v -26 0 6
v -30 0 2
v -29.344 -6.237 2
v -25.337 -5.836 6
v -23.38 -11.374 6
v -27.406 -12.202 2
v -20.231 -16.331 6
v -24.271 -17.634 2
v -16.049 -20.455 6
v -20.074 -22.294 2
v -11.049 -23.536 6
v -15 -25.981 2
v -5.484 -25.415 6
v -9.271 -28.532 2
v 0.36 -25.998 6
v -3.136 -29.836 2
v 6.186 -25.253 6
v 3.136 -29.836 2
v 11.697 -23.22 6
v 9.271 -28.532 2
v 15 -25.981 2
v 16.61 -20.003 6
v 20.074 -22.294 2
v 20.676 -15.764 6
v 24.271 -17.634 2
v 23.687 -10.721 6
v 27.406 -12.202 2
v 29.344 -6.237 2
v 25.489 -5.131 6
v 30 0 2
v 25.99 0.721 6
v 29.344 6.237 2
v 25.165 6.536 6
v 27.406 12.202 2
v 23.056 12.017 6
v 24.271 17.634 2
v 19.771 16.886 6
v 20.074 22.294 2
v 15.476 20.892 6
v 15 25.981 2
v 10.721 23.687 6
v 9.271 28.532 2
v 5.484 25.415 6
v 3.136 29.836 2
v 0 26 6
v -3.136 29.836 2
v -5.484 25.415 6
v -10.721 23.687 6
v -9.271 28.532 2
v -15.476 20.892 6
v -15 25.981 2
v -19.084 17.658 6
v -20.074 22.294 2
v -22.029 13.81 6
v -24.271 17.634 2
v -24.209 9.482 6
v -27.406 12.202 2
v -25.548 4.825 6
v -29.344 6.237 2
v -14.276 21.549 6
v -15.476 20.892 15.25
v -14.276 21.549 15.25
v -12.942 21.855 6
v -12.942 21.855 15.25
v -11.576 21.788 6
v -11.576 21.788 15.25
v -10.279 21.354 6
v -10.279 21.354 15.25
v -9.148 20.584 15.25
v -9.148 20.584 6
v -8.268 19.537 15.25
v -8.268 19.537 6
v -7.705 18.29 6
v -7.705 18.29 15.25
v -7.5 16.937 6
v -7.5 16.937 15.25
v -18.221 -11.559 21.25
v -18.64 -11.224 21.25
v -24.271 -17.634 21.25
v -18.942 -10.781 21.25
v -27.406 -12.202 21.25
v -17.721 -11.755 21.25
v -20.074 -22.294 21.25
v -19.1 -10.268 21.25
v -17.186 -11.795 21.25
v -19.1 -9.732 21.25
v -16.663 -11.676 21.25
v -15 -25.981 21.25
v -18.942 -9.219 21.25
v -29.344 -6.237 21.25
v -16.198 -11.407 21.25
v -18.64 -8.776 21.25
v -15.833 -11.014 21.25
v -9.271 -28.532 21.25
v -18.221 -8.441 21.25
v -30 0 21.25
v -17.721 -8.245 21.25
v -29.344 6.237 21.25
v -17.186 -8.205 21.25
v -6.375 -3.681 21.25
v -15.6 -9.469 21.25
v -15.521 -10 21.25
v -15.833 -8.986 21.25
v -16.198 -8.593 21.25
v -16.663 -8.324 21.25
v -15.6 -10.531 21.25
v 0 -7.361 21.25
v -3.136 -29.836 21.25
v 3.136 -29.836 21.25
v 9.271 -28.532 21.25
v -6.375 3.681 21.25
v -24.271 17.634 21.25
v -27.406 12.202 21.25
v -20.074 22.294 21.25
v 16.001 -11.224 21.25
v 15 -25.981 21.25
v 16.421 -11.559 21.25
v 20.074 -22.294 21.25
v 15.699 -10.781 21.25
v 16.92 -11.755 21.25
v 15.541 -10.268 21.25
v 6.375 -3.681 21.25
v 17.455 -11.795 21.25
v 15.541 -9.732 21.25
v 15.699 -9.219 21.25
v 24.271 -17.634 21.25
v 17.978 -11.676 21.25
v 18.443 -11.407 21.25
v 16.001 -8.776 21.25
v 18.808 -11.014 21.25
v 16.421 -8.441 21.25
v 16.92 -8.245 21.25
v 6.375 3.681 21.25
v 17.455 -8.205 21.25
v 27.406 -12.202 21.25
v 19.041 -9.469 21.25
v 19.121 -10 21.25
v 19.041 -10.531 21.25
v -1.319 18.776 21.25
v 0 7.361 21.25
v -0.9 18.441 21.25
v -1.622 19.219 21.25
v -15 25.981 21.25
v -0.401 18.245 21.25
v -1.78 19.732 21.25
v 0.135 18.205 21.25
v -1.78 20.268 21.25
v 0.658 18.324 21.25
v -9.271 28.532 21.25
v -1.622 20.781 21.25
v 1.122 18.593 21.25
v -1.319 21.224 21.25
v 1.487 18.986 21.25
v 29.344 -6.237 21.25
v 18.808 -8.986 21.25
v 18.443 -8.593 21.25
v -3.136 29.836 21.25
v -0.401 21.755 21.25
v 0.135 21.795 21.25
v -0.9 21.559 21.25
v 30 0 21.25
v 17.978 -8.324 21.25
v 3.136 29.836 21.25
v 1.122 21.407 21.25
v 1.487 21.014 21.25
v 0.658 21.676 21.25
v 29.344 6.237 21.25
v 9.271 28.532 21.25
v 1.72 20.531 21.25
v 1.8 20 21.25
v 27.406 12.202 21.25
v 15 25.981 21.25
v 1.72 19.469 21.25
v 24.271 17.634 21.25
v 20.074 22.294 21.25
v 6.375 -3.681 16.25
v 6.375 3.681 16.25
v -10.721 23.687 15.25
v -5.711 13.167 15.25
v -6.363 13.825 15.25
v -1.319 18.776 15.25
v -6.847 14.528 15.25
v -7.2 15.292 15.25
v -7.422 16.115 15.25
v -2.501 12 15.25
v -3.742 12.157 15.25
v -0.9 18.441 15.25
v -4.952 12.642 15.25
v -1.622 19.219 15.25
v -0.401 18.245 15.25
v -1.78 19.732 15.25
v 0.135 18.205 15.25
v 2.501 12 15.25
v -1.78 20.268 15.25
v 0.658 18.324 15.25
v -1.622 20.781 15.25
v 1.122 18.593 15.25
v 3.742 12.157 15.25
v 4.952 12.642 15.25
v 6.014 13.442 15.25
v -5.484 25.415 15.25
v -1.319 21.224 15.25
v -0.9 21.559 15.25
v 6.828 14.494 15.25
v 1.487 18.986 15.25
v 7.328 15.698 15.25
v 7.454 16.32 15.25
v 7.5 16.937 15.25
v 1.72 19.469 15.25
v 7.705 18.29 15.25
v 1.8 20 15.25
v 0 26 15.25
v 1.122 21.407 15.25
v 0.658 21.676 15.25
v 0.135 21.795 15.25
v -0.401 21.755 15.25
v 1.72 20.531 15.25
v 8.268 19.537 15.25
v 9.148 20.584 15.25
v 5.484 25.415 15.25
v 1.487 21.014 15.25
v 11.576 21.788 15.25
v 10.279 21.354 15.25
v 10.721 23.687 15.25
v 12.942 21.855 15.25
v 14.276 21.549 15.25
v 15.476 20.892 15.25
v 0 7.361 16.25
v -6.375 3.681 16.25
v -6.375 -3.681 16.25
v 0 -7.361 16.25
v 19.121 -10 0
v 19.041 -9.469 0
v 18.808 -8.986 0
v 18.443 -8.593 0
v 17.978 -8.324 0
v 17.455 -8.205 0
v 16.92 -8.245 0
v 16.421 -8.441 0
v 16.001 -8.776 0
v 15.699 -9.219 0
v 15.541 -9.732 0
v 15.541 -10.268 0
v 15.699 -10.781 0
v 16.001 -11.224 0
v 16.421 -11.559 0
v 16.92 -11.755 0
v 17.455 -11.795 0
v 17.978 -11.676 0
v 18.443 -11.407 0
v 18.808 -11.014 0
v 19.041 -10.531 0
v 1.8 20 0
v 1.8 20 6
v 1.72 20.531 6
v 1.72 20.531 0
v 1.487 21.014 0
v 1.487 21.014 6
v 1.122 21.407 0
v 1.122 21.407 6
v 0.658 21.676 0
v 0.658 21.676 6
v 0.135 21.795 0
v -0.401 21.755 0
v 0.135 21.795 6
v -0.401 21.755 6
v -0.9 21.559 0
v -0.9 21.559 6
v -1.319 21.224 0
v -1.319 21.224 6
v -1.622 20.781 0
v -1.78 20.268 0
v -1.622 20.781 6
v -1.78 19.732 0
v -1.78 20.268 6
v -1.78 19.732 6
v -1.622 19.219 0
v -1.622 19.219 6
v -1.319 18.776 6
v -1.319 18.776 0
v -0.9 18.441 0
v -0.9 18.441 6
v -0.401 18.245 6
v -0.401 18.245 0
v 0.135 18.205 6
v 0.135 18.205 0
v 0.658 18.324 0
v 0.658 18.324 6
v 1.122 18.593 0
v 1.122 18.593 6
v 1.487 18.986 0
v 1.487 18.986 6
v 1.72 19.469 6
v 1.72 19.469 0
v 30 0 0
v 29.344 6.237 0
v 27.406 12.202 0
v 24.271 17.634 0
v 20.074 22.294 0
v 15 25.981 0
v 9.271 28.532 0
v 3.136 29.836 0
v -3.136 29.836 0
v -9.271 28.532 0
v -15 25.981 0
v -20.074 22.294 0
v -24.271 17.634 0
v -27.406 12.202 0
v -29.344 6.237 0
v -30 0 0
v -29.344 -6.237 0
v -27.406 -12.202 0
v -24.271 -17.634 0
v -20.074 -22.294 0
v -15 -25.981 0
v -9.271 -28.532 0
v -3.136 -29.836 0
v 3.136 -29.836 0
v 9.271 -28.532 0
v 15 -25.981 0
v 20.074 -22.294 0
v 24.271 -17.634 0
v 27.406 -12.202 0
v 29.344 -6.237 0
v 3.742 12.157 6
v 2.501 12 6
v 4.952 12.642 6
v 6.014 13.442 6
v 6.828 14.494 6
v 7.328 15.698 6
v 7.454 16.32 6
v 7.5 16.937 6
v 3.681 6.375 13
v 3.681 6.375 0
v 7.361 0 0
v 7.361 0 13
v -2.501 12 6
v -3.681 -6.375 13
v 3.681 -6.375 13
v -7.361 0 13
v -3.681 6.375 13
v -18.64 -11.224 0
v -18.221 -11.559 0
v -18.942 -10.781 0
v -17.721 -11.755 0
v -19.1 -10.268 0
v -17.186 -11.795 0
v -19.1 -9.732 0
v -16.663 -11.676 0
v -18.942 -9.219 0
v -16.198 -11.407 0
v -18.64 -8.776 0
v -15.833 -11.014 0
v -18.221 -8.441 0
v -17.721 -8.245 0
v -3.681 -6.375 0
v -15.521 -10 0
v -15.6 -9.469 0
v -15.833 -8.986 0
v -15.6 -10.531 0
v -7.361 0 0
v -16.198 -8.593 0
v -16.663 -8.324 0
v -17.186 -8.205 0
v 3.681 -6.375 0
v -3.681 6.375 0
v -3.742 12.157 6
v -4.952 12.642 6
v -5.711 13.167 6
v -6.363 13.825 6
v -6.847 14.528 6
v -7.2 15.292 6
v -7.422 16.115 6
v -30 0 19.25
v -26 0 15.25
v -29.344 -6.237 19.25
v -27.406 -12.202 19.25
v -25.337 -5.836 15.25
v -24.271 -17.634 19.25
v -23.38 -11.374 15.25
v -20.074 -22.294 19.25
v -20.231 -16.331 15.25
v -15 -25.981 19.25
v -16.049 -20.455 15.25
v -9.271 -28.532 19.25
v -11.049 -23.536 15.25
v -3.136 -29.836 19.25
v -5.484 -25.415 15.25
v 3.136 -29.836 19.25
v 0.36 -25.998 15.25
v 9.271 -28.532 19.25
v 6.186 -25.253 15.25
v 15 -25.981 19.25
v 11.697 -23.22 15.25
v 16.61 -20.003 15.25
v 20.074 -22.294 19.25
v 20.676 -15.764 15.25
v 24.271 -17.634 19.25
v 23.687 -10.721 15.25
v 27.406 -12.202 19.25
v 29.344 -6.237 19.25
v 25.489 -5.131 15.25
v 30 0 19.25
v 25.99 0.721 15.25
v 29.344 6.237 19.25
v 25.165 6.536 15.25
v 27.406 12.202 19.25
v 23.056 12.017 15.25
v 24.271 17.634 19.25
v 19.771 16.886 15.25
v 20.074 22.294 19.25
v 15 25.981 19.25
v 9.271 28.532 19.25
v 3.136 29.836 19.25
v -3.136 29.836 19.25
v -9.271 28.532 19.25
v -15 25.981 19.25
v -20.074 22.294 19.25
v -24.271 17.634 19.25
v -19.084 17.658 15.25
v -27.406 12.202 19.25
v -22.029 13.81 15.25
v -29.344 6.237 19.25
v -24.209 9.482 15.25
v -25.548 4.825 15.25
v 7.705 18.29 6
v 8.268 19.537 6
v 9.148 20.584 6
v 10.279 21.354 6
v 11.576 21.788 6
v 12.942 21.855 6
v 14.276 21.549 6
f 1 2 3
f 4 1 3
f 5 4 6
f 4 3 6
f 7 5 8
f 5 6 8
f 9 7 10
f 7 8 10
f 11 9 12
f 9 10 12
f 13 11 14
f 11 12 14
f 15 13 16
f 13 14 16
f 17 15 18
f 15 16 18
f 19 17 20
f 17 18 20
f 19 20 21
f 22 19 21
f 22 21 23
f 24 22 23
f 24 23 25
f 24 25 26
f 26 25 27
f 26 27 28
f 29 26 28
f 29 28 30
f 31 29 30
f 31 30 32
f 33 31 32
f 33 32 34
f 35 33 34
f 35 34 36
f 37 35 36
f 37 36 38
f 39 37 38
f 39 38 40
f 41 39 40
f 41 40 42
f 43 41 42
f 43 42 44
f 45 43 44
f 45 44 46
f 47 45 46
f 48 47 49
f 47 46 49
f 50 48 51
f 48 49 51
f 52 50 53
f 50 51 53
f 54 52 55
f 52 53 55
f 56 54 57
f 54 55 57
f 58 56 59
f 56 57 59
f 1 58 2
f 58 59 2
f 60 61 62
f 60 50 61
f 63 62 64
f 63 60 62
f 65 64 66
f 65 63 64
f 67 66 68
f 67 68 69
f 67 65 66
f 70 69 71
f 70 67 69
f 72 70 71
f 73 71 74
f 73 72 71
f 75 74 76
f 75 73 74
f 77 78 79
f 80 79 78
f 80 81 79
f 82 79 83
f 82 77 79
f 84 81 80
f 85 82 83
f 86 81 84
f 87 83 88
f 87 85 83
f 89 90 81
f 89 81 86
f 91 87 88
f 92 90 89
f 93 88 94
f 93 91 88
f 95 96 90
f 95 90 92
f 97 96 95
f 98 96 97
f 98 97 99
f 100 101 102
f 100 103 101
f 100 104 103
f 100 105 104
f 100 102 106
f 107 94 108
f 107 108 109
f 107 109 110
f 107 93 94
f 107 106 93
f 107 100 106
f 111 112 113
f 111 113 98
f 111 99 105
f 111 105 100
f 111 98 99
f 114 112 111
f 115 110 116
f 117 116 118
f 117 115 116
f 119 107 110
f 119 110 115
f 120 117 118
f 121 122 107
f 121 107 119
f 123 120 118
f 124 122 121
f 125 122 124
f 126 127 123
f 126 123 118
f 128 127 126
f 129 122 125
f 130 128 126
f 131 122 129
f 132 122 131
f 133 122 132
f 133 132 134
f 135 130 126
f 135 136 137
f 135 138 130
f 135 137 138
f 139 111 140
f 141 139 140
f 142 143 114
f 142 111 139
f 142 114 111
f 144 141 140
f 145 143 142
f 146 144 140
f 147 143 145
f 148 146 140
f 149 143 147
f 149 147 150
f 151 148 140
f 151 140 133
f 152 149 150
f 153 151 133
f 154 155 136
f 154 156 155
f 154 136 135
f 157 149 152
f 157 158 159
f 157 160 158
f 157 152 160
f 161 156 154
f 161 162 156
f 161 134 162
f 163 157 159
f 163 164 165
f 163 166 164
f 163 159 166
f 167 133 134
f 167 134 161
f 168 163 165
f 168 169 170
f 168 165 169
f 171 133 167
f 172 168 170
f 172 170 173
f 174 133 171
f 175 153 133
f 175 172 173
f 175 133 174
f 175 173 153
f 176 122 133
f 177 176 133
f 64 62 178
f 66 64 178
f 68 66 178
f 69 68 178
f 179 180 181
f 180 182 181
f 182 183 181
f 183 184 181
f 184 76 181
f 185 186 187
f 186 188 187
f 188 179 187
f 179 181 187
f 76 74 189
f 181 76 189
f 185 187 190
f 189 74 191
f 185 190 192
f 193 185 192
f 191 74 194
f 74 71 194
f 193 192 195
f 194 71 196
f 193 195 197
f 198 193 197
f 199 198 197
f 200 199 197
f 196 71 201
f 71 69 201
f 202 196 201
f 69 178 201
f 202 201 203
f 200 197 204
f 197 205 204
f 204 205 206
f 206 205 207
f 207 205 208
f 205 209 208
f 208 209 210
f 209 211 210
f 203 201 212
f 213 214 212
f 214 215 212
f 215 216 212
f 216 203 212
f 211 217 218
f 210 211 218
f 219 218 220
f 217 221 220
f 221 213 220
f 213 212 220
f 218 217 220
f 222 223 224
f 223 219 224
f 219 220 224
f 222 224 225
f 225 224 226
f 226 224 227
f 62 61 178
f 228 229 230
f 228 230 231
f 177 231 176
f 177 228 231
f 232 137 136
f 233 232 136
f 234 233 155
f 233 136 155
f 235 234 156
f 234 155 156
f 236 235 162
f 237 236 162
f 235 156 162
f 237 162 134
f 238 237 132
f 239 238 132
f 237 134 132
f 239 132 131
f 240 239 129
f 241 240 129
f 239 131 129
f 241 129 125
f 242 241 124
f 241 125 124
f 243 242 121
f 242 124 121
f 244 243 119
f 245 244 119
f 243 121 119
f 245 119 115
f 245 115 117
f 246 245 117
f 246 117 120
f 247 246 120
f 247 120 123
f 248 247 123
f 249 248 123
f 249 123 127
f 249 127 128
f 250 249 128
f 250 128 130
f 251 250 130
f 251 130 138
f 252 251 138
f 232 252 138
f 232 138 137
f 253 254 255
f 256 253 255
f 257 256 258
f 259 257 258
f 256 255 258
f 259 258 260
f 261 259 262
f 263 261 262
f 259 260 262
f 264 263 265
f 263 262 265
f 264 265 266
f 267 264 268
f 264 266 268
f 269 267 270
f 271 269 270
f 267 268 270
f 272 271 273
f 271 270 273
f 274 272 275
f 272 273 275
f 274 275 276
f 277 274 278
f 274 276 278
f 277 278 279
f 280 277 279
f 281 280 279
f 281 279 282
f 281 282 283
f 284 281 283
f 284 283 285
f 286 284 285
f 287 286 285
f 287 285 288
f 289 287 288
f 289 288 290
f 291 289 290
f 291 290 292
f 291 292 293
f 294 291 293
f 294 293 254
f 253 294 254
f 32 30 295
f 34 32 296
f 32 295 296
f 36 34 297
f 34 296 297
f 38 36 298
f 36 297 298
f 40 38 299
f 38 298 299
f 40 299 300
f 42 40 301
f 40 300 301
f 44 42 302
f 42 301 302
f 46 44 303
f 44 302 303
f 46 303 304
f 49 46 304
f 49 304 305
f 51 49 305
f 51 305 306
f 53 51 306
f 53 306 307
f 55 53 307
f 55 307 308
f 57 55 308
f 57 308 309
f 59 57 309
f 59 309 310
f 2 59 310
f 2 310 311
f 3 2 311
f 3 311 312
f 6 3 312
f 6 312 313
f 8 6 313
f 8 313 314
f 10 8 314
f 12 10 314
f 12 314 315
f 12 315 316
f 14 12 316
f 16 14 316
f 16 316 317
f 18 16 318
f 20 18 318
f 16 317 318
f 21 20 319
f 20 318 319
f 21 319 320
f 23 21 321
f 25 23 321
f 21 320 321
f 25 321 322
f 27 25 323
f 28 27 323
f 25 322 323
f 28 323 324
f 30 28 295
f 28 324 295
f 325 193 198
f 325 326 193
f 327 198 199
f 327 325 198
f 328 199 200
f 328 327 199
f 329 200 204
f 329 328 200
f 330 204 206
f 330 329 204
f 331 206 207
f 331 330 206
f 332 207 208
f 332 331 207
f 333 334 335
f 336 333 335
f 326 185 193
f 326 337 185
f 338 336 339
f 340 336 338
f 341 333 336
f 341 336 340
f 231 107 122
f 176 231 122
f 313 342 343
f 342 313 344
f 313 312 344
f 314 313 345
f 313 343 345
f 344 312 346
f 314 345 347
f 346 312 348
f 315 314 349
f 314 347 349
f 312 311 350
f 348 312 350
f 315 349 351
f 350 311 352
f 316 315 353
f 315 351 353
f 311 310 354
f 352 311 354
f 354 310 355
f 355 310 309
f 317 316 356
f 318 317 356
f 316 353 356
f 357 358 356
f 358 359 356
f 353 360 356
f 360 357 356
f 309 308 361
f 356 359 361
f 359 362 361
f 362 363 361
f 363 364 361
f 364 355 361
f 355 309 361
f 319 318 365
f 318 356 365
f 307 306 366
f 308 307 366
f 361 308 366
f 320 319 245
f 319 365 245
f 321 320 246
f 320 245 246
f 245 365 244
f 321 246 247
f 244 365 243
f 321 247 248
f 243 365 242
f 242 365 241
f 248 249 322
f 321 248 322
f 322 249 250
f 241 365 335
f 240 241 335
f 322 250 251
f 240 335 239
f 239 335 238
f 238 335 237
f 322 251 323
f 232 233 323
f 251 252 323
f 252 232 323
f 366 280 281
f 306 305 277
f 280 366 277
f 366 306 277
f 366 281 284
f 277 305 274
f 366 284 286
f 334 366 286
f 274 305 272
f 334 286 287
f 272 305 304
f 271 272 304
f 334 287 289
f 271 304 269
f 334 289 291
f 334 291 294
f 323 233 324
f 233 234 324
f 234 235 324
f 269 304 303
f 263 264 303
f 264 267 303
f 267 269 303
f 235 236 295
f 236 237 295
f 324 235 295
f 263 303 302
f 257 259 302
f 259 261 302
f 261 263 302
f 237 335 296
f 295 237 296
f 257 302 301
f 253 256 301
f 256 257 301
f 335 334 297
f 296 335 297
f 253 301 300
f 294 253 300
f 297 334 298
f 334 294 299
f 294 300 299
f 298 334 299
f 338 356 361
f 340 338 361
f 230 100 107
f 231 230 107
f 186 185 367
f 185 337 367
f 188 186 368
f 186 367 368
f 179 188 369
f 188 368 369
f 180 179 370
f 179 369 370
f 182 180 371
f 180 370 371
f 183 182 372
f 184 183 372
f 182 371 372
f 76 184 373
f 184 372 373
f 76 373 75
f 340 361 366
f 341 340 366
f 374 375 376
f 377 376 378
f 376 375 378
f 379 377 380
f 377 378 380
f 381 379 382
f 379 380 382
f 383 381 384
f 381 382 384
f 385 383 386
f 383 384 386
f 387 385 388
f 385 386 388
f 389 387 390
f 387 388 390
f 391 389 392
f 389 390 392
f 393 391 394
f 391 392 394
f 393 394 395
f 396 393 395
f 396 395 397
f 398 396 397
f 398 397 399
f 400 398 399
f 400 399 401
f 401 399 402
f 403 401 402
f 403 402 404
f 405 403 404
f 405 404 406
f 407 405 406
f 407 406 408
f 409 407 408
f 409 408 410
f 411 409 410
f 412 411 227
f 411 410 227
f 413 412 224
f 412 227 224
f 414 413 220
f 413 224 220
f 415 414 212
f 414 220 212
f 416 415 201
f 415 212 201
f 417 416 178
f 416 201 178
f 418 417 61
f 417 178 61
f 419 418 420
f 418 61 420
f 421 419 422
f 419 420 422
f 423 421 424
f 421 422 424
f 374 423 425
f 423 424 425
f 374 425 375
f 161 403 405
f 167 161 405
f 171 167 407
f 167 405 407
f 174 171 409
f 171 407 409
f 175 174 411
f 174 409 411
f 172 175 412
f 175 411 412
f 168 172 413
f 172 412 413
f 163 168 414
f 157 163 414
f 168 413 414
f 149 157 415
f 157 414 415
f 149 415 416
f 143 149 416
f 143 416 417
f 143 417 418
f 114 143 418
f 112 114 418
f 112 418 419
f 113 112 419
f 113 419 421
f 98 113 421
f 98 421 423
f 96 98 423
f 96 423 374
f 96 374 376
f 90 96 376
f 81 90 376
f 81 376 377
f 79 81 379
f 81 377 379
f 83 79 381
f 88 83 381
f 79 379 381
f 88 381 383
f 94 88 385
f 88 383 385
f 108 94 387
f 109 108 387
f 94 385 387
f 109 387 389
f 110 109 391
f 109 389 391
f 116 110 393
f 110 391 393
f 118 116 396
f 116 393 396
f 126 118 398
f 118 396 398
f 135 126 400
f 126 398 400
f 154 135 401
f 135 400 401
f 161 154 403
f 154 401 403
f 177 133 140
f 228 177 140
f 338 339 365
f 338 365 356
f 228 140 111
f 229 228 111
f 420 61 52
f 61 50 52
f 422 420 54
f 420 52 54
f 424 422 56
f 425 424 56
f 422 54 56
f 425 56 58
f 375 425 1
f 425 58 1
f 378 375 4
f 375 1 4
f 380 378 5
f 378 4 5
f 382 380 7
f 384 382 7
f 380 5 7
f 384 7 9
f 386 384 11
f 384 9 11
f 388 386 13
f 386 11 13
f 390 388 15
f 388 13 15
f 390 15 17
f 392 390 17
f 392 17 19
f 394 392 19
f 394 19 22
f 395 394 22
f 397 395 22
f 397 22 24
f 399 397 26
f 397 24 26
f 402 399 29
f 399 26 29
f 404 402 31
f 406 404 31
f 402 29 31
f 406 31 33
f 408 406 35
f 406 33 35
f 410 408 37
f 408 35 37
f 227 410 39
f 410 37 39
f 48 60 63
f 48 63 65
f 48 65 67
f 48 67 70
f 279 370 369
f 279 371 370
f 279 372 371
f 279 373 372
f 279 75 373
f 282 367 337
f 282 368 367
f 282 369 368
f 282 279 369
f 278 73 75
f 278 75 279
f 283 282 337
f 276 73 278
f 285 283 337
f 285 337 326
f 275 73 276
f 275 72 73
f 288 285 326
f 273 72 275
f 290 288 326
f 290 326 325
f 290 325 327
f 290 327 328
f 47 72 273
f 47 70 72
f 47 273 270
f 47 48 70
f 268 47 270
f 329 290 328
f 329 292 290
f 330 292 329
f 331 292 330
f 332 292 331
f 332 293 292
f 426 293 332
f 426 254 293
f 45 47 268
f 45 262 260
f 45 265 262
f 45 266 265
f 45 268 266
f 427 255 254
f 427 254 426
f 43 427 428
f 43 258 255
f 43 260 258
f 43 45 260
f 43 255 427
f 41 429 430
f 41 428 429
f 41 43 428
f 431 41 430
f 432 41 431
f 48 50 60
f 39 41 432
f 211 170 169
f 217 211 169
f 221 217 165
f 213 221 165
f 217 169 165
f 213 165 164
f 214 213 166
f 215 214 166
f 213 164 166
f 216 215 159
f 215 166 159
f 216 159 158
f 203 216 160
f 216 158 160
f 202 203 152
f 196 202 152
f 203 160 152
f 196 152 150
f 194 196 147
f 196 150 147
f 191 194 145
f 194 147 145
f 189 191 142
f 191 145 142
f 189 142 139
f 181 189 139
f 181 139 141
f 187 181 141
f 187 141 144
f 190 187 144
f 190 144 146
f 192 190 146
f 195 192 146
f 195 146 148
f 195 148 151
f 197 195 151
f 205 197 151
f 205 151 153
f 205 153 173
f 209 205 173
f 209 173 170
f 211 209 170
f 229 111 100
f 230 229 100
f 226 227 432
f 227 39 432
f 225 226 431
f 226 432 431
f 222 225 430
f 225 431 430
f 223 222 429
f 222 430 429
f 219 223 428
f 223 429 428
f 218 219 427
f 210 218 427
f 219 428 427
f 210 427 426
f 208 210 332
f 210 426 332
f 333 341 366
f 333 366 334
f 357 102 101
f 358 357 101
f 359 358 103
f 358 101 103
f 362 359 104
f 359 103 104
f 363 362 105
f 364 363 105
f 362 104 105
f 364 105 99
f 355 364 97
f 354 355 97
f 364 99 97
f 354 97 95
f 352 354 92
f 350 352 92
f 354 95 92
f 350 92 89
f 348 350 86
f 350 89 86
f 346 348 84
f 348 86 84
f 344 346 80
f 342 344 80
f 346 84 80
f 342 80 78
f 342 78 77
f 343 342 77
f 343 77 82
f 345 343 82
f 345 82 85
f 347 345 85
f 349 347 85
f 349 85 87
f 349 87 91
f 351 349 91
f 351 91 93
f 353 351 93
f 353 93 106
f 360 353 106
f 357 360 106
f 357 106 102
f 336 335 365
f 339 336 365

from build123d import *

# Parameters (mm, degrees)
SKETCH1_R           = 30
BOSS_EXTRUDE1_DEPTH = 21.25
CUT_EXTRUDE1_DEPTH  = 5
SKETCH5_R           = 1.8
CUT_EXTRUDE2_DEPTH  = 48.45063224
CUT_EXTRUDE3_DEPTH  = 13
SKETCH10_W          = 15
SKETCH10_H          = 9.25
CUT_EXTRUDE6_DEPTH  = 28
FILLET6_R           = 5
FILLET7_R           = 5


with BuildPart() as part:
    # Sketch1 → Boss-Extrude1 (new body)
    with BuildSketch(Plane.XY):
        Circle(SKETCH1_R)
    extrude(amount=BOSS_EXTRUDE1_DEPTH)

    # Sketch2 → Cut-Extrude1 (cut)
    with BuildSketch(Plane.XY.offset(21.25)):
        Polygon((0, 7.361215932), (-6.375, 3.680607966), (-6.375, -3.680607966), (0, -7.361215932), (6.375, -3.680607966), (6.375, 3.680607966), align=None)
    extrude(amount=-CUT_EXTRUDE1_DEPTH, mode=Mode.SUBTRACT)

    # Sketch4 → Cut-Revolve1 (revolve, cut)
    with BuildSketch(Plane(origin=(0, 0, 0), x_dir=(1, 0, 0), z_dir=(0, 1, 0)), mode=Mode.PRIVATE) as cut_revolve1_sk:
        Polygon((30, -19.25), (26, -15.25), (26, -6), (30, -2), align=None)
    revolve(cut_revolve1_sk.sketch.rotate(Axis((0, 0, -12.64061748), (0, 0, 1)), 180), axis=Axis((0, 0, -12.64061748), (0, 0, 1)), mode=Mode.SUBTRACT)

    # Sketch5 → Cut-Extrude2 (cut, through all)
    with BuildSketch(Plane.XY.offset(21.25)):
        with Locations((-17.320508076, -10)):
            Circle(SKETCH5_R)
        with Locations((17.320508076, -10)):
            Circle(SKETCH5_R)
        with Locations((0, 20)):
            Circle(SKETCH5_R)
    extrude(amount=-CUT_EXTRUDE2_DEPTH, mode=Mode.SUBTRACT)

    # Sketch6 → Cut-Extrude3 (cut)
    with BuildSketch(Plane(origin=(0, 0, 0), x_dir=(-1, 0, 0), z_dir=(0, 0, -1))):
        Polygon((7.361215932, 0), (3.680607966, 6.375), (-3.680607966, 6.375), (-7.361215932, 0), (-3.680607966, -6.375), (3.680607966, -6.375), align=None)
    extrude(amount=-CUT_EXTRUDE3_DEPTH, mode=Mode.SUBTRACT)

    # Sketch10 → Cut-Extrude6 (cut)
    with BuildSketch(Plane(origin=(0, 40, 0), x_dir=(1, 0, 0), z_dir=(0, 1, 0))):
        with Locations((0, -10.625)):
            Rectangle(SKETCH10_W, SKETCH10_H)
    extrude(amount=-CUT_EXTRUDE6_DEPTH, mode=Mode.SUBTRACT)

    # Fillet6
    fillet6_edges = [part.edges().sort_by_distance(p)[0] for p in [
        (-7.5, 24.894778569, 10.625),
        (7.5, 24.894778569, 10.625),
    ]]
    fillet(fillet6_edges, radius=FILLET6_R)

    # Fillet7
    fillet7_edges = [part.edges().sort_by_distance(p)[0] for p in [
        (7.5, 12, 10.625),
        (-7.5, 12, 10.625),
    ]]
    fillet(fillet7_edges, radius=FILLET7_R)


solid = part.part
